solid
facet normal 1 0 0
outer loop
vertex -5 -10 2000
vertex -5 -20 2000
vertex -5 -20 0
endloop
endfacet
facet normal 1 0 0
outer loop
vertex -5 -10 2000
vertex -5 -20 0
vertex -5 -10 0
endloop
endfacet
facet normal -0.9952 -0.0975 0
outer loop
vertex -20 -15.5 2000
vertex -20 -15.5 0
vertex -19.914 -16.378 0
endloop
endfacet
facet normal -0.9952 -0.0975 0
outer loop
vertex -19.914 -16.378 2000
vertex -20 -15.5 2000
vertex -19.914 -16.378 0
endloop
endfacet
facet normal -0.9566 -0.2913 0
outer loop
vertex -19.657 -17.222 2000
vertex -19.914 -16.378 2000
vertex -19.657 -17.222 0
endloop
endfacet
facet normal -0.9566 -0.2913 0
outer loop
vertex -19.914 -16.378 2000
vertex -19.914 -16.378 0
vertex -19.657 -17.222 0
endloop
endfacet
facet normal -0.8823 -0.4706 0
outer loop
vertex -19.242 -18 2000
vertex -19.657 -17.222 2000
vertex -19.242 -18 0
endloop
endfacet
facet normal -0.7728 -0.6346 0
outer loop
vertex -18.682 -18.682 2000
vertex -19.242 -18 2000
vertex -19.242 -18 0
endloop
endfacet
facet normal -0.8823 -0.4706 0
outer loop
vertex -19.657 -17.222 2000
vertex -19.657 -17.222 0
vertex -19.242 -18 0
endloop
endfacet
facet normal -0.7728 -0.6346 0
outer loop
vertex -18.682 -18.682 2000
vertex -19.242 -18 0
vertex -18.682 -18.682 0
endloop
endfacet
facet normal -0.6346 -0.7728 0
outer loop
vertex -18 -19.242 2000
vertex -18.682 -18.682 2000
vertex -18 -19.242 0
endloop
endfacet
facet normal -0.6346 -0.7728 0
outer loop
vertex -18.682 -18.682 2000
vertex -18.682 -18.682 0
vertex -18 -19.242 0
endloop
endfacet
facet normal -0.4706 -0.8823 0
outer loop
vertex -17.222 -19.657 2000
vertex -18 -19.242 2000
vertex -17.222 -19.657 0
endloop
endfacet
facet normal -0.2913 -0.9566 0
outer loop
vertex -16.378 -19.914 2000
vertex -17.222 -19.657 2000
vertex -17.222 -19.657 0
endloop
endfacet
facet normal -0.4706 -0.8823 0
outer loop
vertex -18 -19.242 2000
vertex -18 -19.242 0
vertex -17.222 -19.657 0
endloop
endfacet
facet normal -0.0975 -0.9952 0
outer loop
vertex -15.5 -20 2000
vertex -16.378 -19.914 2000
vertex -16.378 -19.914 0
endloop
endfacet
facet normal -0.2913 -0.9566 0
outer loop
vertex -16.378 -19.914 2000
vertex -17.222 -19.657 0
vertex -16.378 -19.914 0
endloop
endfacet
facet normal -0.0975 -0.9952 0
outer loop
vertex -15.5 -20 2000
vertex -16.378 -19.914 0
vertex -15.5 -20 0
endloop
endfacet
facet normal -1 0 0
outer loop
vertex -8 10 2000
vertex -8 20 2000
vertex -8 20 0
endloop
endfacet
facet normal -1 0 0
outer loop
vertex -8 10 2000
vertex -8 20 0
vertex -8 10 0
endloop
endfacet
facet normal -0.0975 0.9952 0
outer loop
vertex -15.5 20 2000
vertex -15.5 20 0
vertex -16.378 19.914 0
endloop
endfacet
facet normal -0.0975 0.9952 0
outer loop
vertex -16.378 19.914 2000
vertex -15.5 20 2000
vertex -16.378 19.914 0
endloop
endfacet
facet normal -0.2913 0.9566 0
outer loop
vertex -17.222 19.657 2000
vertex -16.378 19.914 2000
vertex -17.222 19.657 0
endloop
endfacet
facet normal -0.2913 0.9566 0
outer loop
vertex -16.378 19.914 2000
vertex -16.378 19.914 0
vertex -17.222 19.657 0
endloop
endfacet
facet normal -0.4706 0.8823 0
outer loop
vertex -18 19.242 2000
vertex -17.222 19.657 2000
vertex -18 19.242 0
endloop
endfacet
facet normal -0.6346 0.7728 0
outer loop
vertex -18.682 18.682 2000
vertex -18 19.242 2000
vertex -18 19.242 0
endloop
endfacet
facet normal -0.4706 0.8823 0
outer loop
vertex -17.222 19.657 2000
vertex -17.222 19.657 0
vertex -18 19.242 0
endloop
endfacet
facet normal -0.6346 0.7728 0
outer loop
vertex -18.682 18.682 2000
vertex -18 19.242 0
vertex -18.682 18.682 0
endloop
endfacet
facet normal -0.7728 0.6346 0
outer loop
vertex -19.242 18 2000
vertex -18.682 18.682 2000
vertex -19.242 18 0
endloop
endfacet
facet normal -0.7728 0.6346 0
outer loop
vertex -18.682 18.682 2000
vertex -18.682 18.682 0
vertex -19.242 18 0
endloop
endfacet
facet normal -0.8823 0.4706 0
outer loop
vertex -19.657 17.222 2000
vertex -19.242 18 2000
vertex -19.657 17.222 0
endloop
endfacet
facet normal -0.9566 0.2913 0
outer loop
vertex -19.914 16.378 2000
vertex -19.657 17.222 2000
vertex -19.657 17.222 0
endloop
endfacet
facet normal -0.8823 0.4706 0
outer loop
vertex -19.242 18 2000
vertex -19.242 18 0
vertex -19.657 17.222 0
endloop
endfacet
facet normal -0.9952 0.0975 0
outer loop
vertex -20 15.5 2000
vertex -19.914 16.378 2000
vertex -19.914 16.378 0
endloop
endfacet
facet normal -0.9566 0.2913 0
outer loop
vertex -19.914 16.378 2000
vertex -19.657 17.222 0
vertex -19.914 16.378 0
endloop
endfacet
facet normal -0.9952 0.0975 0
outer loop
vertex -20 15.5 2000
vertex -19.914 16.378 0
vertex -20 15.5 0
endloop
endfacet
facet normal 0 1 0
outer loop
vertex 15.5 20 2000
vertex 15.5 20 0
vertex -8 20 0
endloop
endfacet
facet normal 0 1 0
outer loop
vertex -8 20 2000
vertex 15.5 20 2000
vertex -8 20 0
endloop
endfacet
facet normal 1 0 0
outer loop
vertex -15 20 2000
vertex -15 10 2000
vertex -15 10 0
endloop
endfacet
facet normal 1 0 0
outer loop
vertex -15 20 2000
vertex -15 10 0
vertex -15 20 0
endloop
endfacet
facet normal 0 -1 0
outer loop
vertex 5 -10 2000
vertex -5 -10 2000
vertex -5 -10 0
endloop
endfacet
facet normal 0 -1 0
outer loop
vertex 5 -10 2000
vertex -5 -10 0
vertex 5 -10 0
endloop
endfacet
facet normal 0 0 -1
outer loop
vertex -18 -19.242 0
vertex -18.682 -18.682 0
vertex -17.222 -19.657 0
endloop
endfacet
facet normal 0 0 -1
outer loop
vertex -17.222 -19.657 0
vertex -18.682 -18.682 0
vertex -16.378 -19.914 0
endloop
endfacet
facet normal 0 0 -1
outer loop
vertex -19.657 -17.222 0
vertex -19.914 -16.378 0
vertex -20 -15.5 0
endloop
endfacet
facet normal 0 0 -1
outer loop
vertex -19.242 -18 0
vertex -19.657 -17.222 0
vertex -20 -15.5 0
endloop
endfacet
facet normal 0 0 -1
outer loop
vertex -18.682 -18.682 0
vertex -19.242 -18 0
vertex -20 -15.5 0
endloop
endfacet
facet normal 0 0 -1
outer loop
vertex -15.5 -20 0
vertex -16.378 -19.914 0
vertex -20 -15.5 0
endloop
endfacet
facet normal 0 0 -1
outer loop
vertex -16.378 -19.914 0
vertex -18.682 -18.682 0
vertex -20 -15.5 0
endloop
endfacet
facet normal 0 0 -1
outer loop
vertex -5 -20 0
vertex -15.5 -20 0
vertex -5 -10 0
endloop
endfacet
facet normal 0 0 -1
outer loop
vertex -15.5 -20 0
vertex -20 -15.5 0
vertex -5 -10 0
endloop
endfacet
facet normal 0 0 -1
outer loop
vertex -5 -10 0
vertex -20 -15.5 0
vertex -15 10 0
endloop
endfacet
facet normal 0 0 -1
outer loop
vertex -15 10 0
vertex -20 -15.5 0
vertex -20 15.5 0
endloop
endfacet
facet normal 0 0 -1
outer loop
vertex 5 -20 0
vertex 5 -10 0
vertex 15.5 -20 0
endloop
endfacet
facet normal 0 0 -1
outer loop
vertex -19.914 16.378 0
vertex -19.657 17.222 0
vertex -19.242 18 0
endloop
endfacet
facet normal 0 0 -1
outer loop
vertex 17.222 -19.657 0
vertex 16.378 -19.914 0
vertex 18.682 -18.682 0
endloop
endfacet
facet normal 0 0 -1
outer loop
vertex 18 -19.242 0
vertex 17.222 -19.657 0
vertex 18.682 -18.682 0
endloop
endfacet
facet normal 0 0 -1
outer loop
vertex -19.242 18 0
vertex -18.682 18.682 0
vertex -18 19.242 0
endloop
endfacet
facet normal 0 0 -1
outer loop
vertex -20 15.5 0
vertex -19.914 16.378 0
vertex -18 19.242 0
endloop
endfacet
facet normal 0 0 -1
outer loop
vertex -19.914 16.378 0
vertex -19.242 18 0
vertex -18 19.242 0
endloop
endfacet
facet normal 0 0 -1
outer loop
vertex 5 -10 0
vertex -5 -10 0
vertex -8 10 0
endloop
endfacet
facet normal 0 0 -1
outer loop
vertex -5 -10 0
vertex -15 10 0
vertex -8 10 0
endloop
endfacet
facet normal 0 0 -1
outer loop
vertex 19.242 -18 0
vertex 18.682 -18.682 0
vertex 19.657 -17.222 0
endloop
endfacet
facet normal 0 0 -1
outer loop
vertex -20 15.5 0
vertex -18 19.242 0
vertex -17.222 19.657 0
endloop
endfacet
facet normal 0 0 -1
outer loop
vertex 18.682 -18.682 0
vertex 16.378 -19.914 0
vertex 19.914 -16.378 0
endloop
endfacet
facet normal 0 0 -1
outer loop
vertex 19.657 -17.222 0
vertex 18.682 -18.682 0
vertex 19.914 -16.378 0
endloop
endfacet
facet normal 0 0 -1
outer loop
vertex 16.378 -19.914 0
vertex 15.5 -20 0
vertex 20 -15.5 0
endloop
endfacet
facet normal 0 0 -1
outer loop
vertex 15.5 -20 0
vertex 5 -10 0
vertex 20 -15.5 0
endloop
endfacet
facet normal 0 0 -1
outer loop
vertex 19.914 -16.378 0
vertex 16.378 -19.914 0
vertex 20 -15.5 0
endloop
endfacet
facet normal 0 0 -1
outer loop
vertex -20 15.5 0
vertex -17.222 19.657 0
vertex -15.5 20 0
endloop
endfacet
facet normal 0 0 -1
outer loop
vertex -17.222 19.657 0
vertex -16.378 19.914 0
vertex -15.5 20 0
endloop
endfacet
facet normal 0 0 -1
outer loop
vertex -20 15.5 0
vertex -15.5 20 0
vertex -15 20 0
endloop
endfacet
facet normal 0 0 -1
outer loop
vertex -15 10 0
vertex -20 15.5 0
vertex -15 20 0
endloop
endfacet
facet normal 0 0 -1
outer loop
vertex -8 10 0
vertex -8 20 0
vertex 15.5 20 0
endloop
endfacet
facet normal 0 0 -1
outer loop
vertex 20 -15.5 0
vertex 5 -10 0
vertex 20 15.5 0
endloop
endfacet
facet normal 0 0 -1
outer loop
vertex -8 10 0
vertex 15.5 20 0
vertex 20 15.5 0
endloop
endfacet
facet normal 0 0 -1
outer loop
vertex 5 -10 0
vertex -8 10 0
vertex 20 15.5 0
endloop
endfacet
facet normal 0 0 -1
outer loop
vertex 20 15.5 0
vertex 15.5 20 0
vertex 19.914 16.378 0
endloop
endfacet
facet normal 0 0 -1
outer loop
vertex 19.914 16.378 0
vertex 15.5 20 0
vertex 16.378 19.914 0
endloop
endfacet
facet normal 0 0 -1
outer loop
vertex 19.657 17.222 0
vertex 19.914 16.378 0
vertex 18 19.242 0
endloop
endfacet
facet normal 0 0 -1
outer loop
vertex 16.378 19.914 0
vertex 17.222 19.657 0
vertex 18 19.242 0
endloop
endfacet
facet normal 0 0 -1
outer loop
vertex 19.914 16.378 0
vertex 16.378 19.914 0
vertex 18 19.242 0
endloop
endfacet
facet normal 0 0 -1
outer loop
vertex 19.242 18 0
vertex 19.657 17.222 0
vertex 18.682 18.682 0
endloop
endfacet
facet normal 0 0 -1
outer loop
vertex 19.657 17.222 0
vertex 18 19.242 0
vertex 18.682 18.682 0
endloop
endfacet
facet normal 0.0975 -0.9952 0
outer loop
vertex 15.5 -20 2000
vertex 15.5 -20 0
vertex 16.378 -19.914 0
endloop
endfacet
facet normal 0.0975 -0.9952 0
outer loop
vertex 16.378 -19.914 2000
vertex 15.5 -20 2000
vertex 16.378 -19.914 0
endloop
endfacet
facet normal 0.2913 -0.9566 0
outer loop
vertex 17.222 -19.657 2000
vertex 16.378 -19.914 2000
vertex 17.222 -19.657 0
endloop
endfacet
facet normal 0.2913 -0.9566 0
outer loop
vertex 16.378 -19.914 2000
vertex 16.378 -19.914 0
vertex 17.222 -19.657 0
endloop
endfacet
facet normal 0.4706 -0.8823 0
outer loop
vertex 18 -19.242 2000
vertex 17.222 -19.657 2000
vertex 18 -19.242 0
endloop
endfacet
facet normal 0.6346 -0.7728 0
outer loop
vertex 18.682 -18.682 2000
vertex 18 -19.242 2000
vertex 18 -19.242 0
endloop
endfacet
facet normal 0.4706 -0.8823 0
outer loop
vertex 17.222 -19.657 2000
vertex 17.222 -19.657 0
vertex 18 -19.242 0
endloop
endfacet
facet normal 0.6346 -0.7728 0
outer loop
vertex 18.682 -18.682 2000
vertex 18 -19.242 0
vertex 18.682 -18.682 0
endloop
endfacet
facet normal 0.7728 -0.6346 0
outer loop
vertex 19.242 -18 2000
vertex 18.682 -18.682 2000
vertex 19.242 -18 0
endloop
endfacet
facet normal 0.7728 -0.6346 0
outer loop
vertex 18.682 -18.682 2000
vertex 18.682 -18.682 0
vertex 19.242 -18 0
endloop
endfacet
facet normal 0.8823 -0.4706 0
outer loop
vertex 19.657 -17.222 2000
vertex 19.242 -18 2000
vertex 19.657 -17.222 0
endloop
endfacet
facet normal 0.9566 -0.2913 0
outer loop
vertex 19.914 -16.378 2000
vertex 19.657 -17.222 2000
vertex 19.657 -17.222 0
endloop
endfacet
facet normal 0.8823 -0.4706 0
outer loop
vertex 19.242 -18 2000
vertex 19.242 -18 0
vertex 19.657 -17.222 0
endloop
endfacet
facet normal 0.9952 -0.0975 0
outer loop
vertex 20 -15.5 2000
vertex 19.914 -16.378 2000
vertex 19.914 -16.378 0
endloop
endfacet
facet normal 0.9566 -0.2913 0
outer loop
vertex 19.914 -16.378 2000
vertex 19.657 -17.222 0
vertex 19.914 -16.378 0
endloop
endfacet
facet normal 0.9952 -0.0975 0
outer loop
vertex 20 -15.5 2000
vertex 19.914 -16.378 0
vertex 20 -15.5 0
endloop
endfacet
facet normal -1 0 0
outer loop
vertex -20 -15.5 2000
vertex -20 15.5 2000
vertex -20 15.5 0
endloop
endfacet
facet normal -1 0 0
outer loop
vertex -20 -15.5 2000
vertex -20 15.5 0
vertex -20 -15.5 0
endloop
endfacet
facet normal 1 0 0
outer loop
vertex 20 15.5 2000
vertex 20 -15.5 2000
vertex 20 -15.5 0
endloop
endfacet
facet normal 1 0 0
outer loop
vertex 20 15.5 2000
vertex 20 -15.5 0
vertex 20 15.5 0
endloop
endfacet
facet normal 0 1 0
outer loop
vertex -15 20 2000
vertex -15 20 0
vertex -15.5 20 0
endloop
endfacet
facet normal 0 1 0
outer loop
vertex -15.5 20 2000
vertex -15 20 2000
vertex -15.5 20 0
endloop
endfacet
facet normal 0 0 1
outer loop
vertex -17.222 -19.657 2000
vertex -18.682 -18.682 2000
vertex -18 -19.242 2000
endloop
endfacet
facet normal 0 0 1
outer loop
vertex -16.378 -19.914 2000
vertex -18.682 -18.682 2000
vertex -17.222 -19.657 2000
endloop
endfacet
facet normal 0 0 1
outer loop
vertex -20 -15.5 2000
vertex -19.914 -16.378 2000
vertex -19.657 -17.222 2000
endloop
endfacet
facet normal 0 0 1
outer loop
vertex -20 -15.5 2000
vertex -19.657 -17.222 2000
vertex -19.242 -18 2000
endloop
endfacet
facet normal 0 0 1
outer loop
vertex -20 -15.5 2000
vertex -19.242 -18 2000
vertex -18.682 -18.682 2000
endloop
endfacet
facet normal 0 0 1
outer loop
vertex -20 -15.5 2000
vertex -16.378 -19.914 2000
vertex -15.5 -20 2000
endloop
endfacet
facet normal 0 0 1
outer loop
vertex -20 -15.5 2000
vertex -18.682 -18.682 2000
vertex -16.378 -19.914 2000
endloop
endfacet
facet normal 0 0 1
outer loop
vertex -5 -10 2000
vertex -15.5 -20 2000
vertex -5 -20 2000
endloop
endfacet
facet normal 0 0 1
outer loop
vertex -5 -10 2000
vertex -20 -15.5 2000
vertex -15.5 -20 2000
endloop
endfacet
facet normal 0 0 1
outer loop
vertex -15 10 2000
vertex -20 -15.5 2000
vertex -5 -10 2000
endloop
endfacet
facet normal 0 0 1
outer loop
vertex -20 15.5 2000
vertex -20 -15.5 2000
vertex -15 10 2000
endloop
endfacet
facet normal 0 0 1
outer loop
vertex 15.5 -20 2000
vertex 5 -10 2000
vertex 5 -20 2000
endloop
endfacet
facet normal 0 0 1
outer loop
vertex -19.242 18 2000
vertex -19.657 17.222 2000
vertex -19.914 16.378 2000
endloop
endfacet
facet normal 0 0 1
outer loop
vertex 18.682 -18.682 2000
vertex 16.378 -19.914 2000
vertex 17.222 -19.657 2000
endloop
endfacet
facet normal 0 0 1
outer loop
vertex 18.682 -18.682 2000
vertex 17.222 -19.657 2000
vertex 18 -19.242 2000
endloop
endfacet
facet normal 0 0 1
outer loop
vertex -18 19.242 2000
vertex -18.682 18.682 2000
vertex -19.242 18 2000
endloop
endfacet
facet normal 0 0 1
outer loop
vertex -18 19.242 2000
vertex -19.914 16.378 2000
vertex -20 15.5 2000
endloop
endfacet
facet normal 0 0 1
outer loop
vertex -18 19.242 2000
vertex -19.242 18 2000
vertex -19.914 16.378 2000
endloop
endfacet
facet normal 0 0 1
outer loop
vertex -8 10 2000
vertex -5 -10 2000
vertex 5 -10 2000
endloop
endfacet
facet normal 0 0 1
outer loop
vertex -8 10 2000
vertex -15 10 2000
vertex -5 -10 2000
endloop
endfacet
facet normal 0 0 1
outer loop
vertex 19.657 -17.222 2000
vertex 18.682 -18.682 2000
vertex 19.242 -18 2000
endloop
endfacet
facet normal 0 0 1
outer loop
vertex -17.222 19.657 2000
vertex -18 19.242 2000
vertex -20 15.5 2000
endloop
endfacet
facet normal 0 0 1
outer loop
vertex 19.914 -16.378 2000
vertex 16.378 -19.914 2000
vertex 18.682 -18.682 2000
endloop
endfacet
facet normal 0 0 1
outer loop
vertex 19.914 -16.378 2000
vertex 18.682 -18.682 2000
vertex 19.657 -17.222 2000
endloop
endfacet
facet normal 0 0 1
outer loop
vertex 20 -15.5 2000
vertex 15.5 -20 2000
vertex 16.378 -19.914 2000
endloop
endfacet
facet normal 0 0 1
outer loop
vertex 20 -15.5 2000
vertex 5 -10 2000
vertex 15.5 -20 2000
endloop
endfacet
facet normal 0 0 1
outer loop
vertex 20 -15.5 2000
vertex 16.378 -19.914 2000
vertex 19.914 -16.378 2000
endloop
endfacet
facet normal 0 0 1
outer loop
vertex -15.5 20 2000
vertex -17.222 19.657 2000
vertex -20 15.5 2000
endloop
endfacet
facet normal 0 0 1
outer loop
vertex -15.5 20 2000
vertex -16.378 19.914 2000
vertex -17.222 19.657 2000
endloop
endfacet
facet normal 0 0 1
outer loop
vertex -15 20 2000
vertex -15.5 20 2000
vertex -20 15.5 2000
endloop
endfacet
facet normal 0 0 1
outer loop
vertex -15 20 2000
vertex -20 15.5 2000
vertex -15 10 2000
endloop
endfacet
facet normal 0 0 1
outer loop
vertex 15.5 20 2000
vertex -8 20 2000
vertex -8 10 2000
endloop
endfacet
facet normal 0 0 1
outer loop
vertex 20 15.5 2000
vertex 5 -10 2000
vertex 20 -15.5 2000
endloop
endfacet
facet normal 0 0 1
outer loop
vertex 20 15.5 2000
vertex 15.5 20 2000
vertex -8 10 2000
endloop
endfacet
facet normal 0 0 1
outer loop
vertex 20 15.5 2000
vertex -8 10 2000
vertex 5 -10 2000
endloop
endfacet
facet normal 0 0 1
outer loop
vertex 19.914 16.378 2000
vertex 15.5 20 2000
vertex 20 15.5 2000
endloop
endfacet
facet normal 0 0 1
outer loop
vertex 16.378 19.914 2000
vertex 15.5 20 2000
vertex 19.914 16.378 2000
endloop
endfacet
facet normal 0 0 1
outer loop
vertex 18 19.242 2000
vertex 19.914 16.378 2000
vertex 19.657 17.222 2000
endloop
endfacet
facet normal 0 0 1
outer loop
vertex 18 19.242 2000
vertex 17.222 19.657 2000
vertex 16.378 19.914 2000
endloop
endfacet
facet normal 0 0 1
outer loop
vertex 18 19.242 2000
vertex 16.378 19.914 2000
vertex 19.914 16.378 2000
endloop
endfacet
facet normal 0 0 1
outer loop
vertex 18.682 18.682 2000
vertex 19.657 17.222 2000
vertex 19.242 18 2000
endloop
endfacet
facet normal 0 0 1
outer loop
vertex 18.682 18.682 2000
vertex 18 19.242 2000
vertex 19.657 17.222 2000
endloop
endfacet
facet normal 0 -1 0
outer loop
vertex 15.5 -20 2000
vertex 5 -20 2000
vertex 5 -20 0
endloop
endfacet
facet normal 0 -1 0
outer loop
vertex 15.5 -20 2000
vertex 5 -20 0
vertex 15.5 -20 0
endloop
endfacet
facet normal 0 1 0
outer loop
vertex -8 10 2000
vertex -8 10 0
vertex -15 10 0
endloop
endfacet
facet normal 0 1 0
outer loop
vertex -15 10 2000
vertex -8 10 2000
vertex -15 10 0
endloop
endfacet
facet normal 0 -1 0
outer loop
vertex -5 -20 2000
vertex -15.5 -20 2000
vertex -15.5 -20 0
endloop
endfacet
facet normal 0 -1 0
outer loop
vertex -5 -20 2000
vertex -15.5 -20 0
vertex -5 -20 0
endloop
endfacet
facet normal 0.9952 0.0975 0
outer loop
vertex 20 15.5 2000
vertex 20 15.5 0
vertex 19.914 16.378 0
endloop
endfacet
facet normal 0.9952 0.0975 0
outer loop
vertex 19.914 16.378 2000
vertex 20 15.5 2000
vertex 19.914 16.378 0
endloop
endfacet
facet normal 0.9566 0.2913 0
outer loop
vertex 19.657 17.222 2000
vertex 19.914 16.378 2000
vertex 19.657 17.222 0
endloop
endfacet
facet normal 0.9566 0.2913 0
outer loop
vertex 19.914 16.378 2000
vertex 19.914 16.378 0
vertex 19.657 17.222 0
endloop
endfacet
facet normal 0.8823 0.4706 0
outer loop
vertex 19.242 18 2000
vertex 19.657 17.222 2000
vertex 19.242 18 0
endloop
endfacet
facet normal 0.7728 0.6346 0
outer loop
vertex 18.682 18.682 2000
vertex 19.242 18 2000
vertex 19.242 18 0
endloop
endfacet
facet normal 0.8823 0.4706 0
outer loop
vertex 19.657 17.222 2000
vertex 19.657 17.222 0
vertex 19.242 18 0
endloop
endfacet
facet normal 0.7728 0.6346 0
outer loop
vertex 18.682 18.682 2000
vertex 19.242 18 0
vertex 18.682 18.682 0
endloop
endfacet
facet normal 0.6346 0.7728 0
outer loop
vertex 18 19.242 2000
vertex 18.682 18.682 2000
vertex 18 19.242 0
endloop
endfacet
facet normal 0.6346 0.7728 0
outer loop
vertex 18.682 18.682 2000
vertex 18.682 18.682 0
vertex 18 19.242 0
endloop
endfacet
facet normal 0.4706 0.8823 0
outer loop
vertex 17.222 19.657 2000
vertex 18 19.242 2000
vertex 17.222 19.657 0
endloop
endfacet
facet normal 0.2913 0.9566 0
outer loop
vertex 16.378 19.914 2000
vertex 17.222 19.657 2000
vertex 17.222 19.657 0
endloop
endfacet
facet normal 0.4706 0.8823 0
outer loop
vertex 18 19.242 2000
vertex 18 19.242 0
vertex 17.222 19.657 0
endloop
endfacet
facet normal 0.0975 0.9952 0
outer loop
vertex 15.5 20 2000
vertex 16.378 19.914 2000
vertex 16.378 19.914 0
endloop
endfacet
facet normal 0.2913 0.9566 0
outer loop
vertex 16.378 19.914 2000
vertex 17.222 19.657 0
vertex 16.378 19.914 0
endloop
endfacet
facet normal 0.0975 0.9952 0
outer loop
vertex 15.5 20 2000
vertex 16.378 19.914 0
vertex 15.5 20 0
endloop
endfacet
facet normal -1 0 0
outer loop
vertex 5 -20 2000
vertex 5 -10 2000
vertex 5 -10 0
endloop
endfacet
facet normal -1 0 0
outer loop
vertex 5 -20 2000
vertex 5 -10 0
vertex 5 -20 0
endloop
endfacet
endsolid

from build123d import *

# Parameters (mm, degrees)
BOSS_EXTRUDE1_DEPTH = 2000


with BuildPart() as part:
    # Sketch1 → Boss-Extrude1 (new body)
    with BuildSketch(Plane.XY):
        with BuildLine():
            Line((-15.5, -20), (-5, -20))
            Line((-5, -20), (-5, -10))
            Line((-5, -10), (5, -10))
            Line((5, -10), (5, -20))
            Line((5, -20), (15.5, -20))
            ThreePointArc((15.5, -20), (18.681980515, -18.681980515), (20, -15.5))
            Line((20, -15.5), (20, 15.5))
            ThreePointArc((20, 15.5), (18.681980515, 18.681980515), (15.5, 20))
            Line((15.5, 20), (-8, 20))
            Line((-8, 20), (-8, 10))
            Line((-8, 10), (-15, 10))
            Line((-15, 10), (-15, 20))
            Line((-15, 20), (-15.5, 20))
            ThreePointArc((-15.5, 20), (-18.681980515, 18.681980515), (-20, 15.5))
            Line((-20, 15.5), (-20, -15.5))
            ThreePointArc((-20, -15.5), (-18.681980515, -18.681980515), (-15.5, -20))
        make_face()
    extrude(amount=BOSS_EXTRUDE1_DEPTH)


solid = part.part
